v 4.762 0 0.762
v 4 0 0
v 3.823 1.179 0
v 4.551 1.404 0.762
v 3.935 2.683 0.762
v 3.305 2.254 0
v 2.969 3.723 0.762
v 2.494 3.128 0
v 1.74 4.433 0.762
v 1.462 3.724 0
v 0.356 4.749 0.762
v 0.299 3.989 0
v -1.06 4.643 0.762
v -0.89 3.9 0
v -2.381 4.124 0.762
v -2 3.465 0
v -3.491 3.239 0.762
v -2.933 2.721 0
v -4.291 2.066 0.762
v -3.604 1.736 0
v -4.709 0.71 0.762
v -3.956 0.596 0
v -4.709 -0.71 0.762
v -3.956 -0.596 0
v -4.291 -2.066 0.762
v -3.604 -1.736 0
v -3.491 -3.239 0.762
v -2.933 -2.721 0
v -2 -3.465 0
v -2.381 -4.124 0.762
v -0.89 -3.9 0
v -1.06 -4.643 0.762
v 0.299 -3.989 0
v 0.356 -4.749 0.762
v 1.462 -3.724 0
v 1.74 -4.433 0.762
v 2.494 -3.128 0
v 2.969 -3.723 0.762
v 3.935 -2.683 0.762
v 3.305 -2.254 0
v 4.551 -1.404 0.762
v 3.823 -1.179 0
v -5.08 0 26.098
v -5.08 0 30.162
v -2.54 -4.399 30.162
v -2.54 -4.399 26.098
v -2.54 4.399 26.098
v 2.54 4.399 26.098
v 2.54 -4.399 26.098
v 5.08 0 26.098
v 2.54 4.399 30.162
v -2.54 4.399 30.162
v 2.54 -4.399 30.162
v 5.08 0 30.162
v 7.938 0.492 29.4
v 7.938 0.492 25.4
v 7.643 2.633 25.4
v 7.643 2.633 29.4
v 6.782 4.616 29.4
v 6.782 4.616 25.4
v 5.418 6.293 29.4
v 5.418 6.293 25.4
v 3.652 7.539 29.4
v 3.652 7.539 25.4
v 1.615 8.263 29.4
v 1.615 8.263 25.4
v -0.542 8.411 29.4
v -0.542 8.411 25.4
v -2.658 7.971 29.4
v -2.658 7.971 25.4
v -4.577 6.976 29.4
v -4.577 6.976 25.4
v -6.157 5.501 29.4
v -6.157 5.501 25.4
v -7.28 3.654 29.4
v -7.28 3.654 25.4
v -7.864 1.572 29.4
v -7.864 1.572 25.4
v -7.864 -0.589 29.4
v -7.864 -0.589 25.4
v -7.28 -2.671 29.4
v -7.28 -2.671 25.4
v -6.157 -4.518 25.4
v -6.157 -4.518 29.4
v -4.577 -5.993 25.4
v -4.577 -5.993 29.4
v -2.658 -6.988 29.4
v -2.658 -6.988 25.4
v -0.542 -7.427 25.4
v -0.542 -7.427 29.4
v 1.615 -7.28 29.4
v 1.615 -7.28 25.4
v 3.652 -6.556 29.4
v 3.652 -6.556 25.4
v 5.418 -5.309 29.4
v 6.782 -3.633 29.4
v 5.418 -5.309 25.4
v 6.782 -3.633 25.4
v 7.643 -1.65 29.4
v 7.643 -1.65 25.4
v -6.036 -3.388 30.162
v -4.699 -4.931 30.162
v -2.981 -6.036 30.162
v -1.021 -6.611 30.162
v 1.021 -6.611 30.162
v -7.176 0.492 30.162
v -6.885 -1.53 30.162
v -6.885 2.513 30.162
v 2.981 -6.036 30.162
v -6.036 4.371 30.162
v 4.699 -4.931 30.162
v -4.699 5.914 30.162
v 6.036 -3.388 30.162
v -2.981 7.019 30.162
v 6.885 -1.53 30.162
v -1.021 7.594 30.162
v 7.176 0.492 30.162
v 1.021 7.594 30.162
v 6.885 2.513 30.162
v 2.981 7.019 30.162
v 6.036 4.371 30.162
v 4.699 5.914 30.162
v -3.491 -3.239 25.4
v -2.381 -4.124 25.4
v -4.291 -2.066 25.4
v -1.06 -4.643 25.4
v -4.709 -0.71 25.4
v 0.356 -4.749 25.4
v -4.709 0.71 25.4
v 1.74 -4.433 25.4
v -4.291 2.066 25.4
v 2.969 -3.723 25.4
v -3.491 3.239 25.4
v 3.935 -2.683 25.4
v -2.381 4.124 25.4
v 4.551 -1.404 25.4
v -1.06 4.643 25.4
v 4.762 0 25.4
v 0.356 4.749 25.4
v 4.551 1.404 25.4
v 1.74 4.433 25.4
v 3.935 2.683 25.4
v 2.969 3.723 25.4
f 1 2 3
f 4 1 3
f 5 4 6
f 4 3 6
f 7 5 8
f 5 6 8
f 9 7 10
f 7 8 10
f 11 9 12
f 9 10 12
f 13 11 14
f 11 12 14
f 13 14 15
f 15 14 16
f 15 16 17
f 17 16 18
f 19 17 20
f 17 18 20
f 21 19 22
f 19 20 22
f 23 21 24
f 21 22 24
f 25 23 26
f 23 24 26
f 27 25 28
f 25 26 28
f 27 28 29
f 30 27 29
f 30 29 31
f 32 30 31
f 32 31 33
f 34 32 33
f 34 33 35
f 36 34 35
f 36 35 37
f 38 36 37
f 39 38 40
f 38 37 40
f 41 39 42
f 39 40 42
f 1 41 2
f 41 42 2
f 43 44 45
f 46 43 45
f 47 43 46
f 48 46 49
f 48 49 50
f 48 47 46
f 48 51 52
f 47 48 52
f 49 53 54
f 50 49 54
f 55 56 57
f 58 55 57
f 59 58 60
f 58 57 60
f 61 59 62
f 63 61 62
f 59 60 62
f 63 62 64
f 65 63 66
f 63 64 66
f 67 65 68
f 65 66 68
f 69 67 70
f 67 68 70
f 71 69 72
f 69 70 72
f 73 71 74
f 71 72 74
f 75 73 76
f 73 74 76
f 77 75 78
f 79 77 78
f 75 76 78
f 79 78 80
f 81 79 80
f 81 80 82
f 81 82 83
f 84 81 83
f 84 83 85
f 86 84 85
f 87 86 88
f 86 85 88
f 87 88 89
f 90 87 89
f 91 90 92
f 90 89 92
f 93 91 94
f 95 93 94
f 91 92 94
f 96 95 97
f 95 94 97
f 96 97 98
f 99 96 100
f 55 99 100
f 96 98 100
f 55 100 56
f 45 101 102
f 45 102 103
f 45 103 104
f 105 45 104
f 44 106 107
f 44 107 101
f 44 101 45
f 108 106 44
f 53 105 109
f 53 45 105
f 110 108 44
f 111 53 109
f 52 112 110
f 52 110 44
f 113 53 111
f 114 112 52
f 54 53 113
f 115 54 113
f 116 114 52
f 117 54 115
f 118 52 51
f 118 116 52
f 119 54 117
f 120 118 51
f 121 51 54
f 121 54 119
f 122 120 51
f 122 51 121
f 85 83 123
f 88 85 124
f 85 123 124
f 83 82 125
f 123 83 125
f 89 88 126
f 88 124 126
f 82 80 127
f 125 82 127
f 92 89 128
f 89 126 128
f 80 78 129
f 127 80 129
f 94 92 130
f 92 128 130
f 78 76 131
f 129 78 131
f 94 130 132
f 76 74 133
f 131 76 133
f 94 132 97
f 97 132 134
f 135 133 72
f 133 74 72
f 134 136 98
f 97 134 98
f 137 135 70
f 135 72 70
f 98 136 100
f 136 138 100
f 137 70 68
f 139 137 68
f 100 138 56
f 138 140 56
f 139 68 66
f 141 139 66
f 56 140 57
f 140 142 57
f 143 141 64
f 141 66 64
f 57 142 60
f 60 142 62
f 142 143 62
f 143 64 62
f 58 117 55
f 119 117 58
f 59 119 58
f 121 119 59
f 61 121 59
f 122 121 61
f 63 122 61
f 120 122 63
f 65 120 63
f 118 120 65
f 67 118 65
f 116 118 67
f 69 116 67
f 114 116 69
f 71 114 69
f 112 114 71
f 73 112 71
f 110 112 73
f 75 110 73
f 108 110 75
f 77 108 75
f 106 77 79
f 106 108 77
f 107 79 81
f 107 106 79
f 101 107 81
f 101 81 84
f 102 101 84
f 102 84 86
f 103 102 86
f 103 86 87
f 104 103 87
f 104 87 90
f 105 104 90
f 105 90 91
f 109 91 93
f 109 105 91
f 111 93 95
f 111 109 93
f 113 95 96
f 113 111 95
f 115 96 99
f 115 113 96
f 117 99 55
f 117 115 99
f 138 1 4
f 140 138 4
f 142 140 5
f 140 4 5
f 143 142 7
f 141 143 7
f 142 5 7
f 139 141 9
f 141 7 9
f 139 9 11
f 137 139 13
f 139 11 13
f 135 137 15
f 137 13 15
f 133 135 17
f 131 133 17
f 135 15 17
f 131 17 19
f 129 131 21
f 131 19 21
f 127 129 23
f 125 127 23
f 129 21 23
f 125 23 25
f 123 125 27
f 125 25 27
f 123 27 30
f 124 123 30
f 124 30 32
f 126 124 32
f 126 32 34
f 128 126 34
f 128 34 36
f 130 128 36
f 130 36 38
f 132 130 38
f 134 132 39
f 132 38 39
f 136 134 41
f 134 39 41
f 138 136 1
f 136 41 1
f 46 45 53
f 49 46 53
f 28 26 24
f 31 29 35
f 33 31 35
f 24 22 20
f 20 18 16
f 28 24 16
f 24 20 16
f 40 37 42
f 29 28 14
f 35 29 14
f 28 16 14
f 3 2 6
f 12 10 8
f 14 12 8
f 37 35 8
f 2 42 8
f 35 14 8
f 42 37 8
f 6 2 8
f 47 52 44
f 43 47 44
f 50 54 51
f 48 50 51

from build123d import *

# Parameters (mm, degrees)
SKETCH1_R          = 4.7625
EXTRUDE1_DEPTH     = 25.4
SKETCH3_R          = 7.9375
EXTRUDE3_DEPTH     = 4.7625
CHAMFER1_SIZE      = 0.762
CUT_EXTRUDE1_DEPTH = 4.064


with BuildPart() as part:
    # Sketch1 → Extrude1 (new body)
    with BuildSketch(Plane.XY):
        Circle(SKETCH1_R)
    extrude(amount=EXTRUDE1_DEPTH)

    # Sketch3 → Extrude3 (add)
    with BuildSketch(Plane.XY.offset(25.4)):
        with Locations((0, 0.491553118)):
            Circle(SKETCH3_R)
    extrude(amount=EXTRUDE3_DEPTH)

    # Chamfer1
    chamfer1_edges = [part.edges().sort_by_distance(p)[0] for p in [
        (-7.9375, 0.491553118, 30.1625),
        (-4.7625, 0, 0),
    ]]
    chamfer(chamfer1_edges, length=CHAMFER1_SIZE)

    # Sketch4 → Cut-Extrude1 (cut)
    with BuildSketch(Plane.XY.offset(30.1625)):
        Polygon((5.08, 0), (2.54, 4.399409051), (-2.54, 4.399409051), (-5.08, 0), (-2.54, -4.399409051), (2.54, -4.399409051), align=None)
    extrude(amount=-CUT_EXTRUDE1_DEPTH, mode=Mode.SUBTRACT)


solid = part.part
